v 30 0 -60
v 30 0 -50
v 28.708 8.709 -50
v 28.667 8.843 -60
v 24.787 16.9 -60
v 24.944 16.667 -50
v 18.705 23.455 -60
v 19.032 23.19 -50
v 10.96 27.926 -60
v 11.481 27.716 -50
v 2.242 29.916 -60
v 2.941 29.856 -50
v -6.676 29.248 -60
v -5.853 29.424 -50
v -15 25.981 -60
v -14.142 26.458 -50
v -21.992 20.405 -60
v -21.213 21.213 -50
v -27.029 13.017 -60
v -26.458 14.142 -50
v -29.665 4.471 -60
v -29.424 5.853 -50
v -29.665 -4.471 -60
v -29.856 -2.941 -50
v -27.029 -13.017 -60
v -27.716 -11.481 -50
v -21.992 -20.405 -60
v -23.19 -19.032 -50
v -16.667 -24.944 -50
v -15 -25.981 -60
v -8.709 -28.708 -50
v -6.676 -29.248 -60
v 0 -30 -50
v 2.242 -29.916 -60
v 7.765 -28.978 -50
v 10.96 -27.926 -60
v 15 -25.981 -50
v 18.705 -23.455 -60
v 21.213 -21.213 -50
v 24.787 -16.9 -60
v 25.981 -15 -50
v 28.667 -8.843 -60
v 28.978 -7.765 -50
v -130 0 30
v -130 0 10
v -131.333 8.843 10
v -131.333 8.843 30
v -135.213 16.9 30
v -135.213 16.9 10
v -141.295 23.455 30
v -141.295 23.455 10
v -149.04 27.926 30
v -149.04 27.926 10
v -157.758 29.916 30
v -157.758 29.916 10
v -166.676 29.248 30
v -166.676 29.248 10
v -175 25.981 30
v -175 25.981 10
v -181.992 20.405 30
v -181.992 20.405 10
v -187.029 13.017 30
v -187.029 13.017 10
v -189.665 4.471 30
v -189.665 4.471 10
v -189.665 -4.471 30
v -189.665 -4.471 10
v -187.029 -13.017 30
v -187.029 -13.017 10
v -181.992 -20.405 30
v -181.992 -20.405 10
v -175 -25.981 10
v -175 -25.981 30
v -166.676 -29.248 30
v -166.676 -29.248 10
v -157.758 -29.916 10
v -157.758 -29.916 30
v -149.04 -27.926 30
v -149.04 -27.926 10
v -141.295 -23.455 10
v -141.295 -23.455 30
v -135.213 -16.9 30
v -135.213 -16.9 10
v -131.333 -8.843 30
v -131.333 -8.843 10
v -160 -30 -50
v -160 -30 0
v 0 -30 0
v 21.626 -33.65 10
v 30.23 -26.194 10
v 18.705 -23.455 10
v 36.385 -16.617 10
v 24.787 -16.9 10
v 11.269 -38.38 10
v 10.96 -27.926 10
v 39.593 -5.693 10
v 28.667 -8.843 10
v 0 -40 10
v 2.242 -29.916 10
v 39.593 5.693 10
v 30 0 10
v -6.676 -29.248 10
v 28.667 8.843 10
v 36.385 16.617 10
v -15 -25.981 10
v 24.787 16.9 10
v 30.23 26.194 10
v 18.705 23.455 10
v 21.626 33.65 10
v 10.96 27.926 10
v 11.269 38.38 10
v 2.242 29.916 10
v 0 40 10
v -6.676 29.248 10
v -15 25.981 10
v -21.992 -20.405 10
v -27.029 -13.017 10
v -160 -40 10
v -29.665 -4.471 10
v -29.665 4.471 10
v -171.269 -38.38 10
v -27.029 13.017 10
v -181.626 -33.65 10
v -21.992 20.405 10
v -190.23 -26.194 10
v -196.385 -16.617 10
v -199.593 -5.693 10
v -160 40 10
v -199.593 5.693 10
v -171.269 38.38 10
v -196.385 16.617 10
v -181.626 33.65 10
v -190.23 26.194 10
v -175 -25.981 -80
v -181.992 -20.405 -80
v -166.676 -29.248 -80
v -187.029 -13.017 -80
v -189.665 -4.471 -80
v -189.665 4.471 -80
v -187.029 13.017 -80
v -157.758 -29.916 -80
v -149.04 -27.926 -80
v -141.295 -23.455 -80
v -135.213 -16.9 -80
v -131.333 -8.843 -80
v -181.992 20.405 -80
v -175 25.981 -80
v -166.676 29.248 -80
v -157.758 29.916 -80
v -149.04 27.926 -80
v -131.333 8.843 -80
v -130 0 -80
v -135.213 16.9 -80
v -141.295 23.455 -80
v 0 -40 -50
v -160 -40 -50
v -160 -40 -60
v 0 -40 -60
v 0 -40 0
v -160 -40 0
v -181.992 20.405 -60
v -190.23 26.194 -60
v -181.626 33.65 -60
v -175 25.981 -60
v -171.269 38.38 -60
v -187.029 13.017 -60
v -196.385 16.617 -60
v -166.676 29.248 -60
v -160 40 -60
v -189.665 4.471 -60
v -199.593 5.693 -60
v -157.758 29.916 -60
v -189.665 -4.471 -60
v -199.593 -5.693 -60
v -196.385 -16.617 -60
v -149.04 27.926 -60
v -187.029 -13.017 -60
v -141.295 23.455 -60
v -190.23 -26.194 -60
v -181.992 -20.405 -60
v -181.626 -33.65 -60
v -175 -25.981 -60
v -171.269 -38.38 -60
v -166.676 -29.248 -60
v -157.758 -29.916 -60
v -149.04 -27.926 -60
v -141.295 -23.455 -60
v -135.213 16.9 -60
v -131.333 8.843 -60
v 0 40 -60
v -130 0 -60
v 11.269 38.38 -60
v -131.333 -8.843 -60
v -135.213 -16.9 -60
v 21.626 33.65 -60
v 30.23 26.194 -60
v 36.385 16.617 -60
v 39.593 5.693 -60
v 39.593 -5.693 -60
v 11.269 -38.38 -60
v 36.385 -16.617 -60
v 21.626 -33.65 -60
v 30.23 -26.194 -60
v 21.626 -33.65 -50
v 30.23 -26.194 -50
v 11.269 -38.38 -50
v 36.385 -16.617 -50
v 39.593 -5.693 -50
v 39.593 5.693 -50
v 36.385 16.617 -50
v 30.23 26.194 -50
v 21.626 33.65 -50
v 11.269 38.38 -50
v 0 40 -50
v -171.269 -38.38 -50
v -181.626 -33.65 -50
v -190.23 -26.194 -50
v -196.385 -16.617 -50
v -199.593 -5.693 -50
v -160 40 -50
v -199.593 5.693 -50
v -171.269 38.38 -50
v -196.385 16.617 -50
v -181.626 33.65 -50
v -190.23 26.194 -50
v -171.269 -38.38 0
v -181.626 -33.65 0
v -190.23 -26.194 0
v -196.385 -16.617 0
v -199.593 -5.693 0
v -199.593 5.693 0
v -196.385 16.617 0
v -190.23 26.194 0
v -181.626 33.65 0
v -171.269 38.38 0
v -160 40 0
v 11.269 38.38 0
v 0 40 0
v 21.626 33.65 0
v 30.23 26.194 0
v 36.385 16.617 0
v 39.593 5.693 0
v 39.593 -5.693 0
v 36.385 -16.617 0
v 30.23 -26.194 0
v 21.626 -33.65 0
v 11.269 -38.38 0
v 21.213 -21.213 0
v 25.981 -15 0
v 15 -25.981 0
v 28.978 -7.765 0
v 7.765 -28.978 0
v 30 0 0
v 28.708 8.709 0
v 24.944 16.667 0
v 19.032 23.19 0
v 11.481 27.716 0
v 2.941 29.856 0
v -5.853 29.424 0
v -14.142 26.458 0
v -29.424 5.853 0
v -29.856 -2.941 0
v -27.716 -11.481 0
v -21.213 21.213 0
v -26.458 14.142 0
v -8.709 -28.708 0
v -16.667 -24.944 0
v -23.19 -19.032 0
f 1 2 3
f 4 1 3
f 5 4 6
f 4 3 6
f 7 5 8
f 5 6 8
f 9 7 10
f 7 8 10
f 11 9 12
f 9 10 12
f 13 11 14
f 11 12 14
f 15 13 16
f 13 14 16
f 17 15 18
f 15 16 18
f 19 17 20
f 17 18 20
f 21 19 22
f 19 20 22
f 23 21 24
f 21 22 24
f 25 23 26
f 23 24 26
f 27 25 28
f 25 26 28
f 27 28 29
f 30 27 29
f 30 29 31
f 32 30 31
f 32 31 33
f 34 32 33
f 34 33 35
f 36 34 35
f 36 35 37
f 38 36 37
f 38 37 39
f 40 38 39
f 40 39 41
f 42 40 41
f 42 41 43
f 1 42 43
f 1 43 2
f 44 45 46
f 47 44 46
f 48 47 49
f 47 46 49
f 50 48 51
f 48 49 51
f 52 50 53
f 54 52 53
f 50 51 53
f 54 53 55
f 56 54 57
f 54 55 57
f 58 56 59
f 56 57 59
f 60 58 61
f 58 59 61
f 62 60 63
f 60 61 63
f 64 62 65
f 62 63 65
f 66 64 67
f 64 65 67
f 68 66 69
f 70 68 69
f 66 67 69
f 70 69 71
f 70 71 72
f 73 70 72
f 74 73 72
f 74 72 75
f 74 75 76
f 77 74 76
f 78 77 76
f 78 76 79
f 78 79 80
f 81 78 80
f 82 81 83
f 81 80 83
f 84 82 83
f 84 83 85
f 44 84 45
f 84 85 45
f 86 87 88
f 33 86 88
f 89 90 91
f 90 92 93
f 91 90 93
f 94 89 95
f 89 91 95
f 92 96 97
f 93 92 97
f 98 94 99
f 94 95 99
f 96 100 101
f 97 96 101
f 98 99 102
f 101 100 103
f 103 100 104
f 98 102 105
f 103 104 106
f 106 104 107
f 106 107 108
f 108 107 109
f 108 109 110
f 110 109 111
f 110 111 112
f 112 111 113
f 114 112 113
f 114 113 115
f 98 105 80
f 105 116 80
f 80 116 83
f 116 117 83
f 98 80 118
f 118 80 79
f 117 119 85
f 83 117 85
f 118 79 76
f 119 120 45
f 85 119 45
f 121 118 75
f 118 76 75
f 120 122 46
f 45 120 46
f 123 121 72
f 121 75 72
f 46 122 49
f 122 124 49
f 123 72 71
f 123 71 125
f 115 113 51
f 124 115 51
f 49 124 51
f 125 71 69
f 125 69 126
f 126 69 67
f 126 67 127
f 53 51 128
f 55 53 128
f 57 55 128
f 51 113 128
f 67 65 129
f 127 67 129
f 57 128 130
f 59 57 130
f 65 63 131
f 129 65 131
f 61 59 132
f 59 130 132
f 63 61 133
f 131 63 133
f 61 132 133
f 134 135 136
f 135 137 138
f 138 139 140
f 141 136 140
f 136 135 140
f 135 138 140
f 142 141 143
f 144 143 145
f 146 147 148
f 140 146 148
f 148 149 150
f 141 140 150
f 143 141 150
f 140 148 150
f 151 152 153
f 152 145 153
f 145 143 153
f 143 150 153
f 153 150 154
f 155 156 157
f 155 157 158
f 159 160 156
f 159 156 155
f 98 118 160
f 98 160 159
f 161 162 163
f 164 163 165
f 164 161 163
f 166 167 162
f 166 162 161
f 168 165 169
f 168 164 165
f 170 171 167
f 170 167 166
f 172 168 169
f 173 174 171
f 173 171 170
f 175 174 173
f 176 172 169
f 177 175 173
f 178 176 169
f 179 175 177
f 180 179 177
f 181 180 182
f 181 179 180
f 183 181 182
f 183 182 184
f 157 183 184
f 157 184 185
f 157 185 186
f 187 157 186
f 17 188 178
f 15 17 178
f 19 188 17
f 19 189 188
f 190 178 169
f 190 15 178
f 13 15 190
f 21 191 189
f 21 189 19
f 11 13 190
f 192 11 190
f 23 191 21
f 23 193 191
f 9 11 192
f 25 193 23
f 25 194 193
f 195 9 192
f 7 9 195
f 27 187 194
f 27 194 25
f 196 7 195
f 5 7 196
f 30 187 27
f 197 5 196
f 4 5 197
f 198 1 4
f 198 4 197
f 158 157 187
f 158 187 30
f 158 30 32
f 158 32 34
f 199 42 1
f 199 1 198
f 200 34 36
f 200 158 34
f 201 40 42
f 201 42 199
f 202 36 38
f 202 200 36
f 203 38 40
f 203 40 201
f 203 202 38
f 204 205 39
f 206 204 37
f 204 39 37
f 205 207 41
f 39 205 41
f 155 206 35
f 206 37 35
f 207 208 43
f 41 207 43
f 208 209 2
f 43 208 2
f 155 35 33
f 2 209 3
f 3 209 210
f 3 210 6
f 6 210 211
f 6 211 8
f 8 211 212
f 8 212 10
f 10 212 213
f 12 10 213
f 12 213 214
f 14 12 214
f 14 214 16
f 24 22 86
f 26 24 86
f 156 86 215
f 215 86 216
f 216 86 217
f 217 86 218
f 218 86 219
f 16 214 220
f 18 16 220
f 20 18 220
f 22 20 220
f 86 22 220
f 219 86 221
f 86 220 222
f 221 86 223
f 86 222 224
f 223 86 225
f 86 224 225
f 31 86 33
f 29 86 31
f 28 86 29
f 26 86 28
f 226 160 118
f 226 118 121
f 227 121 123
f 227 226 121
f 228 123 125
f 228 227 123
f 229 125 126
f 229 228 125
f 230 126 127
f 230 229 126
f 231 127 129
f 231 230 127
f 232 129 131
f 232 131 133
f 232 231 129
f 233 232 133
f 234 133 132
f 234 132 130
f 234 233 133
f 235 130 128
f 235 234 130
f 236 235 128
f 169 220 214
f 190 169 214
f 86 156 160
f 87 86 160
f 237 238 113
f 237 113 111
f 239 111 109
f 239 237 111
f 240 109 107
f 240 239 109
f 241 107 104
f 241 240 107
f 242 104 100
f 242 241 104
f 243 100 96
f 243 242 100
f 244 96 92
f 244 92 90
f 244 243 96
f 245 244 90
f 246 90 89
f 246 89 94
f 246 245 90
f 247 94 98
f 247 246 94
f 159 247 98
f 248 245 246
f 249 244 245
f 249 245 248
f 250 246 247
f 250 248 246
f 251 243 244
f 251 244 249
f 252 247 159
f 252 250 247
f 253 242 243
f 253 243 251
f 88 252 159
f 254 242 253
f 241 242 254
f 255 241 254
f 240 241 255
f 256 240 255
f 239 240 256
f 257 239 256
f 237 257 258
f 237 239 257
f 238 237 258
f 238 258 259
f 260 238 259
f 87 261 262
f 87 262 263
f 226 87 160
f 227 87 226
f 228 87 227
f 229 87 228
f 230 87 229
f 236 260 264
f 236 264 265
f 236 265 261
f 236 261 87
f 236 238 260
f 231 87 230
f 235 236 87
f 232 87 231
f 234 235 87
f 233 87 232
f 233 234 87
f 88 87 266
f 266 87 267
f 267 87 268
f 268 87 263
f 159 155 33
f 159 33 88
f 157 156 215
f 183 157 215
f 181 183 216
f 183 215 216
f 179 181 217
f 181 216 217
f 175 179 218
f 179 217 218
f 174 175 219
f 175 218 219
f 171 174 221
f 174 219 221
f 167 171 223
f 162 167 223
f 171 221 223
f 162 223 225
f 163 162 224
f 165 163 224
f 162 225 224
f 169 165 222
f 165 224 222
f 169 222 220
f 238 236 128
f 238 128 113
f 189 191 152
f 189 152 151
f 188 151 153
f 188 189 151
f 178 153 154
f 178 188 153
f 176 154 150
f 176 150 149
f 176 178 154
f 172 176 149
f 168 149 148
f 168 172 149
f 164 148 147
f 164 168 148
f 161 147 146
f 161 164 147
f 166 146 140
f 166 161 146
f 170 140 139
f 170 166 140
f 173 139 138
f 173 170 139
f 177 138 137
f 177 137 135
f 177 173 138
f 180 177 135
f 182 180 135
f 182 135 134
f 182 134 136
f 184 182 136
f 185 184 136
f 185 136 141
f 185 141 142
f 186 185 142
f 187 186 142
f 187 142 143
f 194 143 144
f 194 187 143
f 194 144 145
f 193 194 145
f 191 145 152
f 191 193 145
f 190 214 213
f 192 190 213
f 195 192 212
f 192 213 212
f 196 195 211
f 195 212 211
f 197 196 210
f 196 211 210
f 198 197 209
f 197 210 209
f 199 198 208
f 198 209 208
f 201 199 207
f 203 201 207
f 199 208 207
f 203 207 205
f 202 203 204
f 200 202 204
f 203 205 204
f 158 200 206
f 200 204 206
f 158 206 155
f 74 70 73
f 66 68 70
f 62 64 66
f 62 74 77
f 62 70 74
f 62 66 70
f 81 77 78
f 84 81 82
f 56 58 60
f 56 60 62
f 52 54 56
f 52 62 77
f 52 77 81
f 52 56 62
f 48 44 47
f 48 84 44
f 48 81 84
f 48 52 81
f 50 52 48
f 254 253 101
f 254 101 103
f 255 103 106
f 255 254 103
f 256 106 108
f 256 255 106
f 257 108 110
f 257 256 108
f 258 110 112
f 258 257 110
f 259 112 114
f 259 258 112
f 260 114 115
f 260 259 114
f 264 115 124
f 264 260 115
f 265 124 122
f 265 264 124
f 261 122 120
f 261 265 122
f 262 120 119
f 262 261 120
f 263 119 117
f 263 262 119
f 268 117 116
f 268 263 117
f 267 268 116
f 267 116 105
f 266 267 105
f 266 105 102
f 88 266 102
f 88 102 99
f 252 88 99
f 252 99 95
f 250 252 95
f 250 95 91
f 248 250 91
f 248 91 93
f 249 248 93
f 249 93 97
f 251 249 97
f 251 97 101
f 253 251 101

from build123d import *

# Parameters (mm, degrees)
SKETCH2_R           = 30
BOSS_EXTRUDE1_DEPTH = 10
SKETCH3_R           = 30
BOSS_EXTRUDE2_DEPTH = 20
SKETCH5_W           = 160
SKETCH5_H           = 60
BOSS_EXTRUDE3_DEPTH = 10


with BuildPart() as part:
    # Sketch2 → Boss-Extrude1 (new body)
    with BuildSketch(Plane.XY):
        with BuildLine():
            Line((0, -40), (-160, -40))
            ThreePointArc((-160, -40), (-200, 0), (-160, 40))
            Line((-160, 40), (0, 40))
            ThreePointArc((0, 40), (40, 0), (0, -40))
        make_face()
        Circle(SKETCH2_R, mode=Mode.SUBTRACT)
    boss_extrude1 = extrude(amount=BOSS_EXTRUDE1_DEPTH)

    # Sketch3 → Boss-Extrude2 (add)
    with BuildSketch(Plane.XY.offset(10)):
        with Locations((-160, 0)):
            Circle(SKETCH3_R)
    boss_extrude2 = extrude(amount=BOSS_EXTRUDE2_DEPTH)

    # Sketch5 → Boss-Extrude3 (add)
    with BuildSketch(Plane.XZ.offset(40)):
        with Locations((-80, -30)):
            Rectangle(SKETCH5_W, SKETCH5_H)
    extrude(amount=-BOSS_EXTRUDE3_DEPTH)

    # Mirror1: Boss-Extrude1, Boss-Extrude2 across plane
    add(boss_extrude1.mirror(Plane(origin=(0, 0, -25), x_dir=(1, 0, 0), z_dir=(0, 0, -1))))
    add(boss_extrude2.mirror(Plane(origin=(0, 0, -25), x_dir=(1, 0, 0), z_dir=(0, 0, -1))))


solid = part.part
